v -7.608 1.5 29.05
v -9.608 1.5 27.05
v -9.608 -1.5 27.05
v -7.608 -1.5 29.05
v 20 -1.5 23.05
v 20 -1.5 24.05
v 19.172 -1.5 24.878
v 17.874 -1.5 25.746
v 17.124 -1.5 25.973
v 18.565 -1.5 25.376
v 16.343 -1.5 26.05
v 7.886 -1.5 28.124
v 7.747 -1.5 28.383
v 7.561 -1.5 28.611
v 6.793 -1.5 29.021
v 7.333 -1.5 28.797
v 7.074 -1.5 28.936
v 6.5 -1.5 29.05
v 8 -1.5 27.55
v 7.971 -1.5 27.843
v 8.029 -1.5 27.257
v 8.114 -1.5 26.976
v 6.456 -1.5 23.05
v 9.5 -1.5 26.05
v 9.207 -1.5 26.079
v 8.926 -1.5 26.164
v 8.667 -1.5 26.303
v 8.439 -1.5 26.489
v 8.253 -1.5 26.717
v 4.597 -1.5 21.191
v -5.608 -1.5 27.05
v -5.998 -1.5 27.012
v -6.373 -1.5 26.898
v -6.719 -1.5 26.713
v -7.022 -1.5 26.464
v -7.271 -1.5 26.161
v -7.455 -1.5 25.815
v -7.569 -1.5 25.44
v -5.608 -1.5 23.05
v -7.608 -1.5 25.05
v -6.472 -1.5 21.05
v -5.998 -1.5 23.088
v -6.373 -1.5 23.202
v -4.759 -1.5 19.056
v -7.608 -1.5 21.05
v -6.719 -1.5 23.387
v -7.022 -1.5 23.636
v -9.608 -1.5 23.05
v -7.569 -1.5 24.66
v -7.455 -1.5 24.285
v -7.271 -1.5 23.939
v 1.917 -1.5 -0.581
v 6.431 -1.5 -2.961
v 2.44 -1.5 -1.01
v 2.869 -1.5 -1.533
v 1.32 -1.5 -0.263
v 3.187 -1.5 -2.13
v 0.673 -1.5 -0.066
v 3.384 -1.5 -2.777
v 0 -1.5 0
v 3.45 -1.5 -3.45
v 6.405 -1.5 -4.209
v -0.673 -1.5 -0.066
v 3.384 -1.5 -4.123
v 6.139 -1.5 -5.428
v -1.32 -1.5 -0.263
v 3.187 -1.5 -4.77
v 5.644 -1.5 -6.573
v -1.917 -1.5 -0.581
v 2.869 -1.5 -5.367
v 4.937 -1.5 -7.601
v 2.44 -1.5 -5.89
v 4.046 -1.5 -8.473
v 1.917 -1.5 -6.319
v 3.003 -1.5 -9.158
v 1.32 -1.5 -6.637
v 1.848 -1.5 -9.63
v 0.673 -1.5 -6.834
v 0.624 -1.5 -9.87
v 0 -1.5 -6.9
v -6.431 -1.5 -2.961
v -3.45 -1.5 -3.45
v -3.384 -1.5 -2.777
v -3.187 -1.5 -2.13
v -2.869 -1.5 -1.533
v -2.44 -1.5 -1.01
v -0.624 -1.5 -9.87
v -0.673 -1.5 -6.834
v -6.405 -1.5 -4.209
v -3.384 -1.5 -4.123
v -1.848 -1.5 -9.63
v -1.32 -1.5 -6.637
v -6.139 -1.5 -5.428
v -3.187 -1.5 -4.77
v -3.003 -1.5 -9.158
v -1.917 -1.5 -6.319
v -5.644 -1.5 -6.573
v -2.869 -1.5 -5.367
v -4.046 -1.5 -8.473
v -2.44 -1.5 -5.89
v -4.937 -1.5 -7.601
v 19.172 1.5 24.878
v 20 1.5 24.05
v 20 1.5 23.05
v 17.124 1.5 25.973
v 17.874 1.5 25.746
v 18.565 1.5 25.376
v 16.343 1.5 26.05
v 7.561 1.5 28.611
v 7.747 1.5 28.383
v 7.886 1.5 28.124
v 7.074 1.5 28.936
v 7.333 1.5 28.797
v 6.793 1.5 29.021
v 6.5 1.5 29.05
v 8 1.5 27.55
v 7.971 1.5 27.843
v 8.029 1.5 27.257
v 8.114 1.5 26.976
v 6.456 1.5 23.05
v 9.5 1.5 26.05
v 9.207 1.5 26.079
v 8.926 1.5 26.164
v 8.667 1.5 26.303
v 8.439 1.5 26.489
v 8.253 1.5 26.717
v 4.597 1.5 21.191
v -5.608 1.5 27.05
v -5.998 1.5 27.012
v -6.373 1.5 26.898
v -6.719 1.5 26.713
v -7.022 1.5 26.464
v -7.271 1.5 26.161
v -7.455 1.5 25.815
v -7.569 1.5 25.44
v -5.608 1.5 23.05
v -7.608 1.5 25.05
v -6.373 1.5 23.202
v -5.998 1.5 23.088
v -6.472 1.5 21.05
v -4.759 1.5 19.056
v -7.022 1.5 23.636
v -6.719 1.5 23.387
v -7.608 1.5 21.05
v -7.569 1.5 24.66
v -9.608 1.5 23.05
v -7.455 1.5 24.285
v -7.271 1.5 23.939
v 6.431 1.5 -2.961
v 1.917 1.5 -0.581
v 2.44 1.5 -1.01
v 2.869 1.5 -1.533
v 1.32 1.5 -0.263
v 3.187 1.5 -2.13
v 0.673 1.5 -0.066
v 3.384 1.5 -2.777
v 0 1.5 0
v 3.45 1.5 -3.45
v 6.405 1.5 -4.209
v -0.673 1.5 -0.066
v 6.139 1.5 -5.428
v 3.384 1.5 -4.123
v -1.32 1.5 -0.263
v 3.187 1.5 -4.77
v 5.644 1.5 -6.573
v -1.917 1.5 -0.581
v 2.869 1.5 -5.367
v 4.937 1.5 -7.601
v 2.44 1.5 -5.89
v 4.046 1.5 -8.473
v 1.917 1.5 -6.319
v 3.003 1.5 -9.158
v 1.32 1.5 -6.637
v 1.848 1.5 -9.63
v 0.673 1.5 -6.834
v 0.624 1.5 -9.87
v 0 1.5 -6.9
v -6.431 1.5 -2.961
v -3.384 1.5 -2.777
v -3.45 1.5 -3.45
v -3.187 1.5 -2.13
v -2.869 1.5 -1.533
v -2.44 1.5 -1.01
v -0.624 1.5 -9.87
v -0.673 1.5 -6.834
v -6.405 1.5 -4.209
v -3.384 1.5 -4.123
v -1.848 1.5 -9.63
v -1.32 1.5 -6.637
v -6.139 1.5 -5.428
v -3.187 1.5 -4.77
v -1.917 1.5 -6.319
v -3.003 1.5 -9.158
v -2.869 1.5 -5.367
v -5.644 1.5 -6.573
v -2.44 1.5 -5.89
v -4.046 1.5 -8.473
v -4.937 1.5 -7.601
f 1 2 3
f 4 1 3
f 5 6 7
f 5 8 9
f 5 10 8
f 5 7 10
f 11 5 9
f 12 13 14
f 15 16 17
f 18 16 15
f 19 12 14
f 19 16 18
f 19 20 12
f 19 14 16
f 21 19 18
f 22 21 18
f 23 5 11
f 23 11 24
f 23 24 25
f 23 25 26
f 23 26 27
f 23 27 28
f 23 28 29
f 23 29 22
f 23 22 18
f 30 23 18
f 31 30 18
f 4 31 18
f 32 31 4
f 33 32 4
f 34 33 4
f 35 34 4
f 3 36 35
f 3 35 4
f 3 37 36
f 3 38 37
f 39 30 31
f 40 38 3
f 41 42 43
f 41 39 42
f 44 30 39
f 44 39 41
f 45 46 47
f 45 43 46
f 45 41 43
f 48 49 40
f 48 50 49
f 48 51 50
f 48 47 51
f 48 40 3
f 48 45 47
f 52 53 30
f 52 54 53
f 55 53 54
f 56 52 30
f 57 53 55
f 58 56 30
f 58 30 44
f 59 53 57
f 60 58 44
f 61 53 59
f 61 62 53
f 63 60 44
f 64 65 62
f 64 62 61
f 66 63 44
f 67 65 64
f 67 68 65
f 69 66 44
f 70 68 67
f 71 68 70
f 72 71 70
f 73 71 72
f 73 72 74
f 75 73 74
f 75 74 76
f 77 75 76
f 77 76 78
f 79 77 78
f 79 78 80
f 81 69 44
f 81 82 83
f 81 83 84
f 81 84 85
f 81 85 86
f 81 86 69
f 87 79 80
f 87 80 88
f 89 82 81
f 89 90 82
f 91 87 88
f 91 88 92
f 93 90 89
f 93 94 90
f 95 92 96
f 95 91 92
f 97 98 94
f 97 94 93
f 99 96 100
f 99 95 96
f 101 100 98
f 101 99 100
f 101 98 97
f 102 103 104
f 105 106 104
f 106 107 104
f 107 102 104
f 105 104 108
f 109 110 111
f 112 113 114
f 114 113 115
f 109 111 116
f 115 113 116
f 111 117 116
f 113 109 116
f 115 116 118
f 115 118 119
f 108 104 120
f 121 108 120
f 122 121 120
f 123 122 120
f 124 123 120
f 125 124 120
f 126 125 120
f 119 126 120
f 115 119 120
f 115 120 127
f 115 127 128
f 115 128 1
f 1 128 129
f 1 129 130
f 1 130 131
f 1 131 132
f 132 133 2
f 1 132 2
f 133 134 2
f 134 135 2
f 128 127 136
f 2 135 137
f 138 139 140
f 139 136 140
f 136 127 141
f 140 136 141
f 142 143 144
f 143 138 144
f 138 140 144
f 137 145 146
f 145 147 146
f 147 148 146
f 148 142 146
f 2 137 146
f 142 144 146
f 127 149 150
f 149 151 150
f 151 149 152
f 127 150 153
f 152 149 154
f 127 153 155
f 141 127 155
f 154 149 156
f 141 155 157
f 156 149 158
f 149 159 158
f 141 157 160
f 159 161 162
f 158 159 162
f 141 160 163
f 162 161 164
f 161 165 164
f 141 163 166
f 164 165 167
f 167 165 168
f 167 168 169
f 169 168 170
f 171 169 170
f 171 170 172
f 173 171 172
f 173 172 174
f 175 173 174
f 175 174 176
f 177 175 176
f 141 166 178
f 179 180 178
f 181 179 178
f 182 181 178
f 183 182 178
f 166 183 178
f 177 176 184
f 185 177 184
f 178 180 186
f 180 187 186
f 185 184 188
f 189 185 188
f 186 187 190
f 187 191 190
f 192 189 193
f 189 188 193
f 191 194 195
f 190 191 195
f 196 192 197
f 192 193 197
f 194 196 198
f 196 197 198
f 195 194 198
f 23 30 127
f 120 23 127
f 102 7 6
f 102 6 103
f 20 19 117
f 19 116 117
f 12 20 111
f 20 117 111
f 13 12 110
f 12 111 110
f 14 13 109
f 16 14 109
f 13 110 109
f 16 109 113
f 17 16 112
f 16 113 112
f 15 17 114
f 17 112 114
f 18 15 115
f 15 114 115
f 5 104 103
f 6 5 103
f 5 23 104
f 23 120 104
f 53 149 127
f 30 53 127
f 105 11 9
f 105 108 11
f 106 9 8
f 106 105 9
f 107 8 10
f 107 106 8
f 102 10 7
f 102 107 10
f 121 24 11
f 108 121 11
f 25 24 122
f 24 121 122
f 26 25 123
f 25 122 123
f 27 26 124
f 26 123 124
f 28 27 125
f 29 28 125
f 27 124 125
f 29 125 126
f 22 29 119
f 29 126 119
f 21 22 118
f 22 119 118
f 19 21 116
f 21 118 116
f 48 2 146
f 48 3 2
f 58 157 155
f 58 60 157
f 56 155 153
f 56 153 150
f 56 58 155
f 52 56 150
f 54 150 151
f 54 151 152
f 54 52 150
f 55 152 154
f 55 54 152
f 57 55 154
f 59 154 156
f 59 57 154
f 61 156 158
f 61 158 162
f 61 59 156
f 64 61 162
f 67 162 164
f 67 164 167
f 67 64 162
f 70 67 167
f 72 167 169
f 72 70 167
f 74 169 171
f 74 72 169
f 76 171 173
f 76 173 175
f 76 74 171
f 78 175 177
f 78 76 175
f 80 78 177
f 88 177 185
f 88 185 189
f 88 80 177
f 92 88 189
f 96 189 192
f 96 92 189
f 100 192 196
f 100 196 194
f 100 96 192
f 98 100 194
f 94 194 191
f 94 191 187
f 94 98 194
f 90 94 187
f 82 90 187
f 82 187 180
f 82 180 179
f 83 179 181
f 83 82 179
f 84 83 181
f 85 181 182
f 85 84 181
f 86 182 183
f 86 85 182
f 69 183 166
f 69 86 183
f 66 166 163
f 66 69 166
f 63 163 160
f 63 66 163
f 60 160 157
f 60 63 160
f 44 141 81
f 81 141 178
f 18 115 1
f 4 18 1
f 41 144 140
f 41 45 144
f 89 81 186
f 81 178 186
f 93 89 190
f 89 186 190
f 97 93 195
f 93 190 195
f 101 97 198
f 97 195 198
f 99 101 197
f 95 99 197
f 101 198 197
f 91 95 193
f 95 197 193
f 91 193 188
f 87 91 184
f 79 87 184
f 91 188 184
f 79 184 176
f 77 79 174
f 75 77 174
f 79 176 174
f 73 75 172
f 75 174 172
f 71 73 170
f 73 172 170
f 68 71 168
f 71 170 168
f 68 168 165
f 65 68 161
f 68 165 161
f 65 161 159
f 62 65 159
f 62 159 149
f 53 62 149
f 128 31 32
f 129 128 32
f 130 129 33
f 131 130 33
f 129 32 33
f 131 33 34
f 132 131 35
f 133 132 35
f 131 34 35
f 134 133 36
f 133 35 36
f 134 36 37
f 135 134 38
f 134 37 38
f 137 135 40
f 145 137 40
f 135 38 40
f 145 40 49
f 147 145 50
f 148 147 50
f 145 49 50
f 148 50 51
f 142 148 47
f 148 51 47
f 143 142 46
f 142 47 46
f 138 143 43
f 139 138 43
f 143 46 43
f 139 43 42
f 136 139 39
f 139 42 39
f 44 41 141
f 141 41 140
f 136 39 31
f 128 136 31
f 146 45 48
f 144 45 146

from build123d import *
from OCP.BRepFilletAPI import BRepFilletAPI_MakeChamfer, BRepFilletAPI_MakeFillet

# Parameters (mm, degrees)
SKETCH1_R               = 3.45
BOSS_EXTRUDE1_DEPTH     = 1.5
BOSS_EXTRUDE2_DEPTH     = 1.5
CUT_EXTRUDE1_DEPTH      = 36.300885258
CUT_EXTRUDE1_DEPTH_BACK = 36.300885258
SKETCH3_W               = 12
SKETCH3_H               = 3
CHAMFER5_SIZE           = 2
FILLET6_R               = 4
FILLET6_R_2             = 1.5
CHAMFER6_SIZE           = 2
CUT_EXTRUDE2_DEPTH      = 36.300885258
CUT_EXTRUDE2_DEPTH_BACK = 36.300885258
CHAMFER7_SIZE           = 2
CHAMFER7_SIZE2          = 1.864165933


with BuildPart() as part:
    # Sketch1 → Boss-Extrude1 (new, symmetric)
    with BuildSketch(Plane(origin=(0, 0, 0), x_dir=(1, 0, 0), z_dir=(0, 1, 0))):
        with BuildLine():
            Line((-4, -29.05), (-6.431473945, 2.961489101))
            ThreePointArc((-6.431473945, 2.961489101), (0, 9.9), (6.431473945, 2.961489101))
            Line((6.431473945, 2.961489101), (4, -29.05))
            Line((4, -29.05), (-4, -29.05))
        make_face()
        with Locations(Location((0, 3.45, 0), (0, 0, 270))):
            Circle(SKETCH1_R, mode=Mode.SUBTRACT)
    extrude(amount=BOSS_EXTRUDE1_DEPTH, both=True)

    # Sketch2 → Boss-Extrude2 (add, symmetric)
    with BuildSketch(Plane(origin=(0, 0, 0), x_dir=(1, 0, 0), z_dir=(0, 1, 0))):
        Polygon((-4.607650319, -21.05), (-4, -29.05), (-9.607650319, -29.05), (-9.607650319, -21.05), align=None)
        Polygon((4.455737739, -23.05), (20, -23.05), (20, -29.05), (4, -29.05), align=None)
    extrude(amount=BOSS_EXTRUDE2_DEPTH, both=True)

    # Sketch3 → Cut-Extrude1 (cut, two sides: drawn at the far end of the back side and taken through both)
    with BuildSketch(Plane(origin=(0, 0, 0), x_dir=(1, 0, 0), z_dir=(0, 1, 0)).offset(-CUT_EXTRUDE1_DEPTH_BACK)):
        with Locations((14, -27.55)):
            Rectangle(SKETCH3_W, SKETCH3_H)
    extrude(amount=CUT_EXTRUDE1_DEPTH + CUT_EXTRUDE1_DEPTH_BACK, mode=Mode.SUBTRACT)

    # Chamfer5
    chamfer5_edges = [part.edges().sort_by_distance(p)[0] for p in [
        (20, 0, 26.05),
    ]]
    chamfer(chamfer5_edges, length=CHAMFER5_SIZE)

    # Fillet6
    fillet6_edges_1 = [part.edges().sort_by_distance(p)[0] for p in [
        (18, 0, 26.05),
    ]]
    fillet6_edges_2 = [part.edges().sort_by_distance(p)[0] for p in [
        (8, 0, 26.05),
        (8, 0, 29.05),
    ]]
    fillet6 = BRepFilletAPI_MakeFillet(part.part.solid().wrapped)
    for e in fillet6_edges_1:
        fillet6.Add(FILLET6_R - 0.0001, e.wrapped)
    for e in fillet6_edges_2:
        fillet6.Add(FILLET6_R_2 - 0.0001, e.wrapped)
    add(Compound.cast(fillet6.Shape()), mode=Mode.REPLACE)  # a hair under: the kernel refuses the full size

    # Chamfer6
    chamfer6_edges = [part.edges().sort_by_distance(p)[0] for p in [
        (-9.607650319, 0, 21.05),
        (-9.607650319, 0, 29.05),
    ]]
    chamfer(chamfer6_edges, length=CHAMFER6_SIZE)

    # Sketch4 → Cut-Extrude2 (cut, two sides: drawn at the far end of the back side and taken through both)
    with BuildSketch(Plane(origin=(0, 0, 0), x_dir=(1, 0, 0), z_dir=(0, 1, 0)).offset(-CUT_EXTRUDE2_DEPTH_BACK)):
        with BuildLine():
            Line((-5.607650319, -23.05), (-5.607650319, -27.05))
            ThreePointArc((-5.607650319, -27.05), (-7.607650319, -25.05), (-5.607650319, -23.05))
        make_face()
    extrude(amount=CUT_EXTRUDE2_DEPTH + CUT_EXTRUDE2_DEPTH_BACK, mode=Mode.SUBTRACT)

    # Chamfer7: one chamfer whose edges measure the first distance from different faces: ONE call of the kernel's chamfer builder (chamfer() names one face for all edges)
    chamfer7_edges_1 = [part.edges().sort_by_distance(p)[0] for p in [
        (4.455737739, 0, 23.05),
    ]]
    chamfer7_side_1 = [part.faces().sort_by_distance(p)[0] for p in [
        (12.22786887, 0, 23.05),
    ]]
    chamfer7_edges_2 = [part.edges().sort_by_distance(p)[0] for p in [
        (-4.607650319, 0, 21.05),
    ]]
    chamfer7_side_2 = [part.faces().sort_by_distance(p)[0] for p in [
        (-5.519562132, 0, 9.04425545),
    ]]
    chamfer7 = BRepFilletAPI_MakeChamfer(part.part.solid().wrapped)
    for e in chamfer7_edges_1:
        chamfer7.Add(CHAMFER7_SIZE, CHAMFER7_SIZE2, e.wrapped, chamfer7_side_1[0].wrapped)  # the first distance lies on this face
    for e in chamfer7_edges_2:
        chamfer7.Add(CHAMFER7_SIZE, CHAMFER7_SIZE2, e.wrapped, chamfer7_side_2[0].wrapped)  # the first distance lies on this face
    add(Compound.cast(chamfer7.Shape()), mode=Mode.REPLACE)


solid = part.part
